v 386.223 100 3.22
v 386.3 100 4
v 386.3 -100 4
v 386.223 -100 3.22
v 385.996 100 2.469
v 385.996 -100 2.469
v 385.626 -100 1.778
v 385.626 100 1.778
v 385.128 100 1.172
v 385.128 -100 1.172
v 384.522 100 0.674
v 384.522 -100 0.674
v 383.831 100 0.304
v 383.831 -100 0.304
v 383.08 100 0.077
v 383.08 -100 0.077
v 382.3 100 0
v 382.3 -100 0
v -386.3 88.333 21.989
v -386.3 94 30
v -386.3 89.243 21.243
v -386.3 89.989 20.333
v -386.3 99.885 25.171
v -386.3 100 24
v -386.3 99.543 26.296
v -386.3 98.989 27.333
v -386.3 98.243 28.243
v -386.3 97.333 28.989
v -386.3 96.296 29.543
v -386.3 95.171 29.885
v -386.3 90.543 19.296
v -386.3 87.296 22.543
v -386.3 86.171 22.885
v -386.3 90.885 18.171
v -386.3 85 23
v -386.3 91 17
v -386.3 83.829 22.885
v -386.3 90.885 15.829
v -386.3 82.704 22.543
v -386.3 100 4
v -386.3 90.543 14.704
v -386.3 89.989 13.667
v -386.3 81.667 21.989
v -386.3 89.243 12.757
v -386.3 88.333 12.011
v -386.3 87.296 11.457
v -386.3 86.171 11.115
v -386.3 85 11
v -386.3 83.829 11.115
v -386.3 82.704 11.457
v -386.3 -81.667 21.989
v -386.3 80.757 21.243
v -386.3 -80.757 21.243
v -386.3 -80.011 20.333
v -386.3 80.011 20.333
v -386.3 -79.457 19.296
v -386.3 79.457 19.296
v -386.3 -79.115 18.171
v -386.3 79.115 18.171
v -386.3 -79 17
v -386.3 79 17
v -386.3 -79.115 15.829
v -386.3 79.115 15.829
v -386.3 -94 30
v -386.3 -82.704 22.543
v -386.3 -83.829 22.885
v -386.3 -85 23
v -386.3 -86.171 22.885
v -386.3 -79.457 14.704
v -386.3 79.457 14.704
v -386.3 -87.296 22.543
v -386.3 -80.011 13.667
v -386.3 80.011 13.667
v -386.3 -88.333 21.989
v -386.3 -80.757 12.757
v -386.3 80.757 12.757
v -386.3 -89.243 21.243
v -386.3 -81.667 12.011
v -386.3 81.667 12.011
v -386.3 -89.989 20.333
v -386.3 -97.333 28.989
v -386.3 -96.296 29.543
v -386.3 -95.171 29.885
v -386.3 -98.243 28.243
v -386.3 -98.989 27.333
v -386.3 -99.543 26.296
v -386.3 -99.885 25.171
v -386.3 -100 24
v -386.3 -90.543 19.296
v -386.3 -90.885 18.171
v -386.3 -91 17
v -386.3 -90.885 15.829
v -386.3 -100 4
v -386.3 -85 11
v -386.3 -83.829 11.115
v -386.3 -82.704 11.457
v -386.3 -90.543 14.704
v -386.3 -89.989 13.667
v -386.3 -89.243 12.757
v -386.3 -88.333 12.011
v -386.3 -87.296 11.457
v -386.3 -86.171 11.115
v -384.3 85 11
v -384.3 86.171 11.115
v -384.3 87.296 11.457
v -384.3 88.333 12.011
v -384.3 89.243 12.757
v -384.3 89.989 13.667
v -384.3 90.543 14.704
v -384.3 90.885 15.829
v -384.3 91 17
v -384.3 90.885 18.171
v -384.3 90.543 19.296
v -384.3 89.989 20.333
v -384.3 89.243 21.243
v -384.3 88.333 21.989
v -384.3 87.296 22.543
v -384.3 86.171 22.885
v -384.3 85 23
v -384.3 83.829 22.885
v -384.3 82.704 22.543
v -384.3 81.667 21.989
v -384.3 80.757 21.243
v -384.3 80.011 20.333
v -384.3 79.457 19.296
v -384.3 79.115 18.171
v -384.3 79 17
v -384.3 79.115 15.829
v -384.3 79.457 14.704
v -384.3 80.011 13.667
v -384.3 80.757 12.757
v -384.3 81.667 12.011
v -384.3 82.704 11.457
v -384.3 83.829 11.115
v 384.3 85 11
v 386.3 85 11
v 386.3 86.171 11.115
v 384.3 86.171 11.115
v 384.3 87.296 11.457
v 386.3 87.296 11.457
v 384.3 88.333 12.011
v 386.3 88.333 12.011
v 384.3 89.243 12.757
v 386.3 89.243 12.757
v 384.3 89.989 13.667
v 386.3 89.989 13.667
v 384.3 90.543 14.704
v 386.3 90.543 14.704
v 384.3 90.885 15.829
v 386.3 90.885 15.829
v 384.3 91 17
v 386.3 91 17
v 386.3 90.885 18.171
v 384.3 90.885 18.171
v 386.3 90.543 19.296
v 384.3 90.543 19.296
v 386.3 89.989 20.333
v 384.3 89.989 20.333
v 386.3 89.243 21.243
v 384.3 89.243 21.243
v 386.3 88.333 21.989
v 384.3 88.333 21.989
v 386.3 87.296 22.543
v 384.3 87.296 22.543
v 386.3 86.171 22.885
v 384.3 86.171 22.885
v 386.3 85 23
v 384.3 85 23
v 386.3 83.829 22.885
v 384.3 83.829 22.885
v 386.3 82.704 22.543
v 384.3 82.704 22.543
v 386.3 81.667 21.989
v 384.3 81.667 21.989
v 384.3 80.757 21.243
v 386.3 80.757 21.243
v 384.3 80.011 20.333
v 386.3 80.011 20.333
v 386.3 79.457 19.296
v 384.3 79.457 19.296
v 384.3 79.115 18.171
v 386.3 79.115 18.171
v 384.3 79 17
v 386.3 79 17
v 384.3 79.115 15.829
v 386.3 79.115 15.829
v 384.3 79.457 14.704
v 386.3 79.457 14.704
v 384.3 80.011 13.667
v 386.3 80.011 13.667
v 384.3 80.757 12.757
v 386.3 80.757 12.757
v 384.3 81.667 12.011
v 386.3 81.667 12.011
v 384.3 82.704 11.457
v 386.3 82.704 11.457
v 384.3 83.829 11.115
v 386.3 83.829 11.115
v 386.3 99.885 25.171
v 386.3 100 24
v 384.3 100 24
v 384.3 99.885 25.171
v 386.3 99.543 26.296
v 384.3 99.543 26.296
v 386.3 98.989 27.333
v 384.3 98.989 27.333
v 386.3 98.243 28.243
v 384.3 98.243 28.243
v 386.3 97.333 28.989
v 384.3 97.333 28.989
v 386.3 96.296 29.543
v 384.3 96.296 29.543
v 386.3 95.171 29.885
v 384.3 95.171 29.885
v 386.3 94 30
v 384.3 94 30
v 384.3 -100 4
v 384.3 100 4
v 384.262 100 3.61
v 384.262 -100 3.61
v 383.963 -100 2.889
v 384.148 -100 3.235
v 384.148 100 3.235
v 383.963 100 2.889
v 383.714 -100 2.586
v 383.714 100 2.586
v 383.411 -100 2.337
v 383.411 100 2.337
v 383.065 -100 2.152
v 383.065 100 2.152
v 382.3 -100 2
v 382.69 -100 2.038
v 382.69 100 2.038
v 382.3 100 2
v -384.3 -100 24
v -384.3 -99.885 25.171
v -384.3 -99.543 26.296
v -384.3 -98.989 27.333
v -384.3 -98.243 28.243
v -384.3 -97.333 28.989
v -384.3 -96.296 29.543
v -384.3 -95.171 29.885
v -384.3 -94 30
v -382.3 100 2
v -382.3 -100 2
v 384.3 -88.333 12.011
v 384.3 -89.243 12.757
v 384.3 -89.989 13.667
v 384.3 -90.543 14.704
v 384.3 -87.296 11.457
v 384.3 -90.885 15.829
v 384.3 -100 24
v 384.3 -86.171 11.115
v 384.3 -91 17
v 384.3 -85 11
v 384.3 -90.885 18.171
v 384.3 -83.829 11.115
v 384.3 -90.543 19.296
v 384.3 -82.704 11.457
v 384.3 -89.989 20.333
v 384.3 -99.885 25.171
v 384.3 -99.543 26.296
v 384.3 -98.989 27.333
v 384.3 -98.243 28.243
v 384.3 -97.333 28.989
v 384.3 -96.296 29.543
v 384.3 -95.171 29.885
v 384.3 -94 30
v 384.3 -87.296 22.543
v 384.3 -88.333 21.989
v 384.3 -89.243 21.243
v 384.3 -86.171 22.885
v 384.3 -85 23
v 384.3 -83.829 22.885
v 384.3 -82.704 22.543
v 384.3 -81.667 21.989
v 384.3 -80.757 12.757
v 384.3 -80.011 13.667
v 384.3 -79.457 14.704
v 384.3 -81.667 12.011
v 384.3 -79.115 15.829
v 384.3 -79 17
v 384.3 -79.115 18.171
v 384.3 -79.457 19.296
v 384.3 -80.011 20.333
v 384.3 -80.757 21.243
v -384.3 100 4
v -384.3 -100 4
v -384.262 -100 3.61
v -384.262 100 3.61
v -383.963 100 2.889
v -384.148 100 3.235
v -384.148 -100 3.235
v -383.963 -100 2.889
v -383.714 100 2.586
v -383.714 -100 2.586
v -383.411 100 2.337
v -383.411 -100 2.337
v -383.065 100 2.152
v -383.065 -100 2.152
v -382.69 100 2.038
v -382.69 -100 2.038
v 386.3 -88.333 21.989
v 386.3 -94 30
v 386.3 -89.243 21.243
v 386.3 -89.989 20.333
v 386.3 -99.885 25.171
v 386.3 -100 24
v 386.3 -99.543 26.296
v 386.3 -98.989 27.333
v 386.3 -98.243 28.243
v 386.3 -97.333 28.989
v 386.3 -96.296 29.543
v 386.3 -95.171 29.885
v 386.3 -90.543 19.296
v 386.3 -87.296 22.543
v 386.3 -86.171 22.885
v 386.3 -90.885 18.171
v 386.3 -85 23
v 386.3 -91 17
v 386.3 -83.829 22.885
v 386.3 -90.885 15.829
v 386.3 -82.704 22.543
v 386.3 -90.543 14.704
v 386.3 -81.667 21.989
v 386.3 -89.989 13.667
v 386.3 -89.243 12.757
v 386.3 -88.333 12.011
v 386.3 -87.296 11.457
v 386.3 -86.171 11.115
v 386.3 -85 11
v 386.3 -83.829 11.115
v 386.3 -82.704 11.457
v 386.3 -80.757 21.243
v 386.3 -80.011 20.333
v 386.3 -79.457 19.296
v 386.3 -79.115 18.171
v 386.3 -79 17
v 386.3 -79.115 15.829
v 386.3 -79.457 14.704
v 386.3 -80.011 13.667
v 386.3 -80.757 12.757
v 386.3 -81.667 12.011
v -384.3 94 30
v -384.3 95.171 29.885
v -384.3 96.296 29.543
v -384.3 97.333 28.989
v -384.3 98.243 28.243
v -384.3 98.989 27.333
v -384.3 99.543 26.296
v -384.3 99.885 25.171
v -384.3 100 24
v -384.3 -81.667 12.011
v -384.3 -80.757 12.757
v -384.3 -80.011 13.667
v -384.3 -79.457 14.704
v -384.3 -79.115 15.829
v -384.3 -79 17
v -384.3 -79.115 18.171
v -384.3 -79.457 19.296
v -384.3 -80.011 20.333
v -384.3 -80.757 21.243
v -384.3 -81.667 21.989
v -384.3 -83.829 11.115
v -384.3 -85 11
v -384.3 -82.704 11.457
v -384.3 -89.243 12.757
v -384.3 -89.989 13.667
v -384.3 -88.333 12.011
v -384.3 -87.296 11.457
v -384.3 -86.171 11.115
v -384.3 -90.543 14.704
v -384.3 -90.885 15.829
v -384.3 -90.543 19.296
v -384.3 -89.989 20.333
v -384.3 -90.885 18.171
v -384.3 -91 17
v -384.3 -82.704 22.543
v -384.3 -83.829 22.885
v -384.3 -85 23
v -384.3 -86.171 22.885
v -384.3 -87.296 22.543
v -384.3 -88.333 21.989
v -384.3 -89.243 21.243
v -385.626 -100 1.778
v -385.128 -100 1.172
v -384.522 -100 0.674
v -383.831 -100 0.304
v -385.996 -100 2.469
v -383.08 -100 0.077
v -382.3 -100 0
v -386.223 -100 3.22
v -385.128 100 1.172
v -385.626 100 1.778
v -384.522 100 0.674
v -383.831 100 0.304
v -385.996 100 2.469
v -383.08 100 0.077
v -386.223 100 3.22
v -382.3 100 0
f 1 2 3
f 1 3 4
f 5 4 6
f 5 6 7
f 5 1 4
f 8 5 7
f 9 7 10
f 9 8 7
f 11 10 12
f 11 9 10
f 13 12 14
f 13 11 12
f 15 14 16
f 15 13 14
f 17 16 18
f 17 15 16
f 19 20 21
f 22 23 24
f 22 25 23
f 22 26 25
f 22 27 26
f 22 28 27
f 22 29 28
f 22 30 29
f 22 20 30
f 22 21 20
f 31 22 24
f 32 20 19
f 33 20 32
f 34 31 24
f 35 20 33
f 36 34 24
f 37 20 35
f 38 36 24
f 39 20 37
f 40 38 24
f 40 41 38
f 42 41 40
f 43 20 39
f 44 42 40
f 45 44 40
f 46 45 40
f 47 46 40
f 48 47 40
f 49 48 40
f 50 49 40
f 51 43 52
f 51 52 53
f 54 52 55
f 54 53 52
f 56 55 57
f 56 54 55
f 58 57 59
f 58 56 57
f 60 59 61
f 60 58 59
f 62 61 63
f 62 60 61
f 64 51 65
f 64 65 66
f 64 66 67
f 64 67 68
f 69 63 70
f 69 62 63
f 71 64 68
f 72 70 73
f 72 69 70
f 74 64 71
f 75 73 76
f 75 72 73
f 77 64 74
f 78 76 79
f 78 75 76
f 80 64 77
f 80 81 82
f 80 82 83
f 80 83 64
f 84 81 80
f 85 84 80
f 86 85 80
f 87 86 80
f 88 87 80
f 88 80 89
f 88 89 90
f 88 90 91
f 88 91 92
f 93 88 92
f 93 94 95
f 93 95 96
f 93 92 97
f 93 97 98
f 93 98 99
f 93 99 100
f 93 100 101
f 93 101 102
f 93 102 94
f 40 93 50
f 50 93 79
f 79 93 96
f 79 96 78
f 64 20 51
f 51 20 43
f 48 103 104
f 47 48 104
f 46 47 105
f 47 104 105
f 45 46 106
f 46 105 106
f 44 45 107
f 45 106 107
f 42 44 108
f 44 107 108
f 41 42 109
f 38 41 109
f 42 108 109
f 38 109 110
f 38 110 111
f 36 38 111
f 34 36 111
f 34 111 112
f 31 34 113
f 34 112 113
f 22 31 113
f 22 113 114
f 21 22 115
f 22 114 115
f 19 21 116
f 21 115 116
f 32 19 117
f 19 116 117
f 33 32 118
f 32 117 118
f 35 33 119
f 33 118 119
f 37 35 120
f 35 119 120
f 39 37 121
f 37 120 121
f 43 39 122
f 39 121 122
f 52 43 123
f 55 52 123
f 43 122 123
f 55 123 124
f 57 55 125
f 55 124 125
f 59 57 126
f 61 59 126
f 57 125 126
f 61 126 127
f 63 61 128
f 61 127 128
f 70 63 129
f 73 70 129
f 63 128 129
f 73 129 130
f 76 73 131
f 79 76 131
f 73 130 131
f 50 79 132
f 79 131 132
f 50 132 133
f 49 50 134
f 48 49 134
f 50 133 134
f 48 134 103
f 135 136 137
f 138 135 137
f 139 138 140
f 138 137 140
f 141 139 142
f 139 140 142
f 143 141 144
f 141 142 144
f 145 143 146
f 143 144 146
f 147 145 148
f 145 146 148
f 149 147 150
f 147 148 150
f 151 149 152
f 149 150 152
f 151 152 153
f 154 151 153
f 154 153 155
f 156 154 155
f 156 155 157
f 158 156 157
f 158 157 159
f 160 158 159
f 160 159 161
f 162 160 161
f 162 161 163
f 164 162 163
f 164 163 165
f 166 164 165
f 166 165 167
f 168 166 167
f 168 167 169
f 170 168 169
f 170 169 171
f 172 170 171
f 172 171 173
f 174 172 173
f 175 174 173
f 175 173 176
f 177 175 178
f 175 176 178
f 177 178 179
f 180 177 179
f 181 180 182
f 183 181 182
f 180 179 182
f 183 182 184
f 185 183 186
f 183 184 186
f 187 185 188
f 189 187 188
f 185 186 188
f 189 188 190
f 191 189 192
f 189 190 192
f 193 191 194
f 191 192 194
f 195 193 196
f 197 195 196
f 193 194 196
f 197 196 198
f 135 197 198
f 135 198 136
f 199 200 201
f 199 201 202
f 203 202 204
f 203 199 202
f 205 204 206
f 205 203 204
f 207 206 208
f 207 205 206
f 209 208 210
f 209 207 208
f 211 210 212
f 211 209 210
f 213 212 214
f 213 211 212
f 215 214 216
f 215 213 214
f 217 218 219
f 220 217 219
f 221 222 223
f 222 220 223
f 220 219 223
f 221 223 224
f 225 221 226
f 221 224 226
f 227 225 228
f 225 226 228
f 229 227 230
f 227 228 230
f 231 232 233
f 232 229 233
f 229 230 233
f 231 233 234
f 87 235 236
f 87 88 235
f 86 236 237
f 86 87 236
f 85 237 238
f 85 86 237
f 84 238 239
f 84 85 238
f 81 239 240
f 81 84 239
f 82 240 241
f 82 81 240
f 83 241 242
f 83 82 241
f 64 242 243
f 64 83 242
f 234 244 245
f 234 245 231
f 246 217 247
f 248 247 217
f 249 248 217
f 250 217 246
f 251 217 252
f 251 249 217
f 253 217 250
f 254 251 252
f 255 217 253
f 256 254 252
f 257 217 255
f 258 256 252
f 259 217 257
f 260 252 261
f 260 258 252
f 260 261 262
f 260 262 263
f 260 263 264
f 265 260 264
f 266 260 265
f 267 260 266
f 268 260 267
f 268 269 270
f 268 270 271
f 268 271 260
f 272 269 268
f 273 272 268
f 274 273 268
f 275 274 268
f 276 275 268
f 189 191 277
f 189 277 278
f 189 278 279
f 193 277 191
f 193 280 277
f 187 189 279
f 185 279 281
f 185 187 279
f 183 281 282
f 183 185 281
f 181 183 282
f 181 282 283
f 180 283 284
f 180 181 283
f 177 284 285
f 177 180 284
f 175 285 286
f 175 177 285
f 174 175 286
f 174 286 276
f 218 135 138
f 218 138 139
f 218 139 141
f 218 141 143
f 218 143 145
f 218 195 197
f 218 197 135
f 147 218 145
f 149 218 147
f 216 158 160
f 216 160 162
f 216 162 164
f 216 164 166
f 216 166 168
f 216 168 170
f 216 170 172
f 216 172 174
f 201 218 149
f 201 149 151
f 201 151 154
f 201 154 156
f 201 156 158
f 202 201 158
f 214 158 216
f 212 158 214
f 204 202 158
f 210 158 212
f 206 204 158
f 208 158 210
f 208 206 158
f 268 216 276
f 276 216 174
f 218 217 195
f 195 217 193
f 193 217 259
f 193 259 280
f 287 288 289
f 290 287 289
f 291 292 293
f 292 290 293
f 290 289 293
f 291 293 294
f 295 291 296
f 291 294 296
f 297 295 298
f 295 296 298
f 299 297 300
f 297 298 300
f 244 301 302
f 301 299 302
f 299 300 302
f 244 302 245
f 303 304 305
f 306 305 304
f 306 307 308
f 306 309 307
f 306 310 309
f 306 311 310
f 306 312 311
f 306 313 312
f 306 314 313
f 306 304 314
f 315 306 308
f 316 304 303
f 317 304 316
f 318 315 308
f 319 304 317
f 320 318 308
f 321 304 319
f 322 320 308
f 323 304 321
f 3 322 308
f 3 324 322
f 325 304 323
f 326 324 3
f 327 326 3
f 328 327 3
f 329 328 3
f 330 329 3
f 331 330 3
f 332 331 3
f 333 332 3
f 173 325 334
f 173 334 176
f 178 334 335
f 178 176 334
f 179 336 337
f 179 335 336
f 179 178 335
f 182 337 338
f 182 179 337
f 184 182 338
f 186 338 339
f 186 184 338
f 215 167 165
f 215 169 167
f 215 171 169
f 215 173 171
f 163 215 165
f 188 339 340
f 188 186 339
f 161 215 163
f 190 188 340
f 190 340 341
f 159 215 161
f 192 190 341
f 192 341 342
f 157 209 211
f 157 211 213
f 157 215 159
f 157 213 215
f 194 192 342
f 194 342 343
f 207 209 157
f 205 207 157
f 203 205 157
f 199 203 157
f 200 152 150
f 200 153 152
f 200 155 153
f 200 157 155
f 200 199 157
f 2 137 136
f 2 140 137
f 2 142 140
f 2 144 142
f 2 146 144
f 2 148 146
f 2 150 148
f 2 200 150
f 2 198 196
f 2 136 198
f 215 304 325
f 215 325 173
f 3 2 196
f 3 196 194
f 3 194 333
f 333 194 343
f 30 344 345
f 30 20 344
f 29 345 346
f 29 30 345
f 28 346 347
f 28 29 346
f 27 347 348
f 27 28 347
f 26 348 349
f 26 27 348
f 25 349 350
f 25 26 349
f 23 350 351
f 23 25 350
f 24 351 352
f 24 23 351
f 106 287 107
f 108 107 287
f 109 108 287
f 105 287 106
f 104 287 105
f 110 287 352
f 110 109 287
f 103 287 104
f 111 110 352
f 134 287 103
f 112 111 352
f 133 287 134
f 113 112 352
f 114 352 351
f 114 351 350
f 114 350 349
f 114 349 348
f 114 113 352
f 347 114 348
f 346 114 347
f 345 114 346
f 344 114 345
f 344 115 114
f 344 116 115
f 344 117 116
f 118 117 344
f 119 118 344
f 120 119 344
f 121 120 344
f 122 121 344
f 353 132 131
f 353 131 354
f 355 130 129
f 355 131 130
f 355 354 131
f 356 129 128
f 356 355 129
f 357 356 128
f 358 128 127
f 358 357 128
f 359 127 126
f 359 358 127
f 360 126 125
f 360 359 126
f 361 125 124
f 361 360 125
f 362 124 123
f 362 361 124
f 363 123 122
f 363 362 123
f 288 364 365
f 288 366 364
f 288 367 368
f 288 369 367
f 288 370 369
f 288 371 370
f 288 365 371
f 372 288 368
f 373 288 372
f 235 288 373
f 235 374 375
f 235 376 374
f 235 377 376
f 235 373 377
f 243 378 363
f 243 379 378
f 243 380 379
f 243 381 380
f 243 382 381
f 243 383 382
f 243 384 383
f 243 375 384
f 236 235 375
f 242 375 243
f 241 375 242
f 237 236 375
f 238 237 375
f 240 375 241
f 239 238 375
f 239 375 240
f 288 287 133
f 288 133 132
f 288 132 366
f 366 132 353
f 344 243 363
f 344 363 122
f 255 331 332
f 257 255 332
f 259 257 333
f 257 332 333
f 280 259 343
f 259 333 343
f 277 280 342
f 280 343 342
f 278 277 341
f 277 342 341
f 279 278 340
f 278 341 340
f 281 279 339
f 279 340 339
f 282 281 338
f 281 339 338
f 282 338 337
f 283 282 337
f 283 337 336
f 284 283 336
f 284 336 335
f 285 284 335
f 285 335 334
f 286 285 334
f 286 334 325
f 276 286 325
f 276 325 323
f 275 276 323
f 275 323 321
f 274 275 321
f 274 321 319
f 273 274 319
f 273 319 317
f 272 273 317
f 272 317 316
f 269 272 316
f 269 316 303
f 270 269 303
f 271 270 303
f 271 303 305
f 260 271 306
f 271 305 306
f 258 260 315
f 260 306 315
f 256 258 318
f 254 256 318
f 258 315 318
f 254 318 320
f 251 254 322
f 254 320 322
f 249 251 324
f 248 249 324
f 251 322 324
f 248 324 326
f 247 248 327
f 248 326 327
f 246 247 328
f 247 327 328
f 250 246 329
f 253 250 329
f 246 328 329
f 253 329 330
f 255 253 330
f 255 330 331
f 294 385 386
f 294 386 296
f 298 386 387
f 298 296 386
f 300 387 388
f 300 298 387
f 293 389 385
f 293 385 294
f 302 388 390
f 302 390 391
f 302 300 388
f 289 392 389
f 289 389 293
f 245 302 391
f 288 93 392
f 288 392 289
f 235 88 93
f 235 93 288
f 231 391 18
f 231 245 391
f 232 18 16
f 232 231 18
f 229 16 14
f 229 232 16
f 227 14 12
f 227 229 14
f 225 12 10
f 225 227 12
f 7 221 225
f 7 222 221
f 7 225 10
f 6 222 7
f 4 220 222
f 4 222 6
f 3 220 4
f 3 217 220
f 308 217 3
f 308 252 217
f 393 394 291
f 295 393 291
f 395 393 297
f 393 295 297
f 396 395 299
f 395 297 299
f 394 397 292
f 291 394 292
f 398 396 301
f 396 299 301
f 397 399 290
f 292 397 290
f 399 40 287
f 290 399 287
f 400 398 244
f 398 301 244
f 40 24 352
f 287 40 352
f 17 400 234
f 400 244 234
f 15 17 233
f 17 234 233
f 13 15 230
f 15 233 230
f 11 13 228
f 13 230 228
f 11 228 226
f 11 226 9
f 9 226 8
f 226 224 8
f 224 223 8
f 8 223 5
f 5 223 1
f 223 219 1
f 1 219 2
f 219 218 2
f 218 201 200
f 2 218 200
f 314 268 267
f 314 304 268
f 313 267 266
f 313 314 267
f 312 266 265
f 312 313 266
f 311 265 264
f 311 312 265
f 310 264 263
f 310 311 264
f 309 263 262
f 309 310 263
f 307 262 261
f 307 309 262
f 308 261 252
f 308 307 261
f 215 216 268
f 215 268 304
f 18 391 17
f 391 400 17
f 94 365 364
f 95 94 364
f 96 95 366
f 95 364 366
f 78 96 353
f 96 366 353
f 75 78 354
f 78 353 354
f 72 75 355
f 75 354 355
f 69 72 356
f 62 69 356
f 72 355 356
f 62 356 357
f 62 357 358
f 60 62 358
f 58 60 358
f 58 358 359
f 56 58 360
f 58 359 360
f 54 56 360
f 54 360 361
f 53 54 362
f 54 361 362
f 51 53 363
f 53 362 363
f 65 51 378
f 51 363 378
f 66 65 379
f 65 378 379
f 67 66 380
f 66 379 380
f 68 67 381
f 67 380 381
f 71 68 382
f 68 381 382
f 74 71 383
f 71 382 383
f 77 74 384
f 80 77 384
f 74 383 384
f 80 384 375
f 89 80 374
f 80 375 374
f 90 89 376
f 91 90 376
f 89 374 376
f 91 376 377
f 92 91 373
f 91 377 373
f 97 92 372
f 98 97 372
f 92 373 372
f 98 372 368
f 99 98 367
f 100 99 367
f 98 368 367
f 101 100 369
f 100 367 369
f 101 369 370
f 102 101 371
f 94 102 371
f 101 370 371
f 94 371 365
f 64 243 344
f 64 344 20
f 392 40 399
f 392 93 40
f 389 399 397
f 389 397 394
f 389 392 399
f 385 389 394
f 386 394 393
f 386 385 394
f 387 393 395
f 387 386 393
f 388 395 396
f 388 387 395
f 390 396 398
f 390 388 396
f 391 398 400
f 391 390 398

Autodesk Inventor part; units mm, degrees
ref_plane "YZ Plane" through (0, 0, 0) normal (1, 0, 0) x (0, 1, 0)
ref_plane "XZ Plane" through (0, 0, 0) normal (0, 1, 0) x (-1, 0, 0)
ref_plane "XY Plane" through (0, 0, 0) normal (0, 0, 1) x (1, 0, 0)
sketch "Boceto1" plane through (0, 0, 0) normal (0, 0, 1) x (1, 0, 0)
  line L0 (386.3, -100) -> (-386.3, -100)
  line L1 (-386.3, -100) -> (-386.3, 100)
  line L2 (-386.3, 100) -> (386.3, 100)
  line L3 (386.3, 100) -> (386.3, -100)
  line L4 (386.3, -100) -> (-386.3, 100) construction
  line L5 (-386.3, -100) -> (386.3, 100) construction
  point P0 (0, 0)
  dimension "d0" = 772.6
  dimension "d1" = 200
extrude "Placa1" add sketch "Boceto1" along normal blind 2
sketch "Boceto2" plane through (-384.3, -100, 0) normal (-1, 0, 0) x (0, -1, 0)
  line L0 (-200, 0) -> (0, 0)
  line L1 (0, 0) -> (0, 30)
  line L2 (0, 30) -> (-200, 30)
  line L3 (-200, 30) -> (-200, 0)
edge flange "Pestaña1" height 30 angle 90 thickness 2 bend radius 2 thickness toward (-1, 0, 0) relief tear relief width 2 relief depth 1 corner gap 2 corner form 0 edges at (-386.3, 0, 2) (386.3, 0, 2) wall of the first edge with corners at (-384.3, 100, 0) (-384.3, -100, 0) (-384.3, -100, 30) (-384.3, 100, 30)
bend "Doblez1"
corner "Esquina1"
sketch "Boceto3" plane through (386.3, -100, 30) normal (1, 0, 0) x (0, 0, -1)
  circle A0 centre (13, 185) radius 6
  circle A1 centre (13, 15) radius 6
  line L0 (26, 0) -> (0, 0) projected
  line L1 (0, 200) -> (26, 200) projected
  point P0 (30, 100)
  point P1 (13, 0)
  point P2 (13, 200)
  dimension "d13" = 12
  dimension "d14" = 12
  dimension "d16" = 15
  dimension "d17" = 15
extrude "Extrusión1" cut sketch "Boceto3" against normal through all
fillet "Redondeo de esquina1" radius 6 4 edges at (385.3, -100, 30) (-385.3, -100, 30) (-385.3, 100, 30) (385.3, 100, 30)
equation "\"d2\" = Thickness"
equation "\"d3\" = BendReliefWidth"
equation "\"d4\" = BendReliefDepth"
equation "\"d5\" = MinimumRemnant"
equation "\"d6\" = TransitionRadius"
equation "\"d9\" = BendRadius"
equation "\"d10\" = CornerReliefSize"
equation "\"d11\" = GapSize"
equation "\"d12\" = JacobiRadiusSize"
equation "\"BendRadius\" = Thickness"
equation "\"BendReliefWidth\" = Thickness"
equation "\"BendReliefDepth\" = 0.5 * Thickness"
equation "\"CornerReliefSize\" = 4 * Thickness"
equation "\"MinimumRemnant\" = 2 * Thickness"
equation "\"TransitionRadius\" = BendRadius"
equation "\"JacobiRadiusSize\" = BendRadius"
equation "\"GapSize\" = Thickness"
equation "\"Thickness\" = 2"
properties part number "Conector"
